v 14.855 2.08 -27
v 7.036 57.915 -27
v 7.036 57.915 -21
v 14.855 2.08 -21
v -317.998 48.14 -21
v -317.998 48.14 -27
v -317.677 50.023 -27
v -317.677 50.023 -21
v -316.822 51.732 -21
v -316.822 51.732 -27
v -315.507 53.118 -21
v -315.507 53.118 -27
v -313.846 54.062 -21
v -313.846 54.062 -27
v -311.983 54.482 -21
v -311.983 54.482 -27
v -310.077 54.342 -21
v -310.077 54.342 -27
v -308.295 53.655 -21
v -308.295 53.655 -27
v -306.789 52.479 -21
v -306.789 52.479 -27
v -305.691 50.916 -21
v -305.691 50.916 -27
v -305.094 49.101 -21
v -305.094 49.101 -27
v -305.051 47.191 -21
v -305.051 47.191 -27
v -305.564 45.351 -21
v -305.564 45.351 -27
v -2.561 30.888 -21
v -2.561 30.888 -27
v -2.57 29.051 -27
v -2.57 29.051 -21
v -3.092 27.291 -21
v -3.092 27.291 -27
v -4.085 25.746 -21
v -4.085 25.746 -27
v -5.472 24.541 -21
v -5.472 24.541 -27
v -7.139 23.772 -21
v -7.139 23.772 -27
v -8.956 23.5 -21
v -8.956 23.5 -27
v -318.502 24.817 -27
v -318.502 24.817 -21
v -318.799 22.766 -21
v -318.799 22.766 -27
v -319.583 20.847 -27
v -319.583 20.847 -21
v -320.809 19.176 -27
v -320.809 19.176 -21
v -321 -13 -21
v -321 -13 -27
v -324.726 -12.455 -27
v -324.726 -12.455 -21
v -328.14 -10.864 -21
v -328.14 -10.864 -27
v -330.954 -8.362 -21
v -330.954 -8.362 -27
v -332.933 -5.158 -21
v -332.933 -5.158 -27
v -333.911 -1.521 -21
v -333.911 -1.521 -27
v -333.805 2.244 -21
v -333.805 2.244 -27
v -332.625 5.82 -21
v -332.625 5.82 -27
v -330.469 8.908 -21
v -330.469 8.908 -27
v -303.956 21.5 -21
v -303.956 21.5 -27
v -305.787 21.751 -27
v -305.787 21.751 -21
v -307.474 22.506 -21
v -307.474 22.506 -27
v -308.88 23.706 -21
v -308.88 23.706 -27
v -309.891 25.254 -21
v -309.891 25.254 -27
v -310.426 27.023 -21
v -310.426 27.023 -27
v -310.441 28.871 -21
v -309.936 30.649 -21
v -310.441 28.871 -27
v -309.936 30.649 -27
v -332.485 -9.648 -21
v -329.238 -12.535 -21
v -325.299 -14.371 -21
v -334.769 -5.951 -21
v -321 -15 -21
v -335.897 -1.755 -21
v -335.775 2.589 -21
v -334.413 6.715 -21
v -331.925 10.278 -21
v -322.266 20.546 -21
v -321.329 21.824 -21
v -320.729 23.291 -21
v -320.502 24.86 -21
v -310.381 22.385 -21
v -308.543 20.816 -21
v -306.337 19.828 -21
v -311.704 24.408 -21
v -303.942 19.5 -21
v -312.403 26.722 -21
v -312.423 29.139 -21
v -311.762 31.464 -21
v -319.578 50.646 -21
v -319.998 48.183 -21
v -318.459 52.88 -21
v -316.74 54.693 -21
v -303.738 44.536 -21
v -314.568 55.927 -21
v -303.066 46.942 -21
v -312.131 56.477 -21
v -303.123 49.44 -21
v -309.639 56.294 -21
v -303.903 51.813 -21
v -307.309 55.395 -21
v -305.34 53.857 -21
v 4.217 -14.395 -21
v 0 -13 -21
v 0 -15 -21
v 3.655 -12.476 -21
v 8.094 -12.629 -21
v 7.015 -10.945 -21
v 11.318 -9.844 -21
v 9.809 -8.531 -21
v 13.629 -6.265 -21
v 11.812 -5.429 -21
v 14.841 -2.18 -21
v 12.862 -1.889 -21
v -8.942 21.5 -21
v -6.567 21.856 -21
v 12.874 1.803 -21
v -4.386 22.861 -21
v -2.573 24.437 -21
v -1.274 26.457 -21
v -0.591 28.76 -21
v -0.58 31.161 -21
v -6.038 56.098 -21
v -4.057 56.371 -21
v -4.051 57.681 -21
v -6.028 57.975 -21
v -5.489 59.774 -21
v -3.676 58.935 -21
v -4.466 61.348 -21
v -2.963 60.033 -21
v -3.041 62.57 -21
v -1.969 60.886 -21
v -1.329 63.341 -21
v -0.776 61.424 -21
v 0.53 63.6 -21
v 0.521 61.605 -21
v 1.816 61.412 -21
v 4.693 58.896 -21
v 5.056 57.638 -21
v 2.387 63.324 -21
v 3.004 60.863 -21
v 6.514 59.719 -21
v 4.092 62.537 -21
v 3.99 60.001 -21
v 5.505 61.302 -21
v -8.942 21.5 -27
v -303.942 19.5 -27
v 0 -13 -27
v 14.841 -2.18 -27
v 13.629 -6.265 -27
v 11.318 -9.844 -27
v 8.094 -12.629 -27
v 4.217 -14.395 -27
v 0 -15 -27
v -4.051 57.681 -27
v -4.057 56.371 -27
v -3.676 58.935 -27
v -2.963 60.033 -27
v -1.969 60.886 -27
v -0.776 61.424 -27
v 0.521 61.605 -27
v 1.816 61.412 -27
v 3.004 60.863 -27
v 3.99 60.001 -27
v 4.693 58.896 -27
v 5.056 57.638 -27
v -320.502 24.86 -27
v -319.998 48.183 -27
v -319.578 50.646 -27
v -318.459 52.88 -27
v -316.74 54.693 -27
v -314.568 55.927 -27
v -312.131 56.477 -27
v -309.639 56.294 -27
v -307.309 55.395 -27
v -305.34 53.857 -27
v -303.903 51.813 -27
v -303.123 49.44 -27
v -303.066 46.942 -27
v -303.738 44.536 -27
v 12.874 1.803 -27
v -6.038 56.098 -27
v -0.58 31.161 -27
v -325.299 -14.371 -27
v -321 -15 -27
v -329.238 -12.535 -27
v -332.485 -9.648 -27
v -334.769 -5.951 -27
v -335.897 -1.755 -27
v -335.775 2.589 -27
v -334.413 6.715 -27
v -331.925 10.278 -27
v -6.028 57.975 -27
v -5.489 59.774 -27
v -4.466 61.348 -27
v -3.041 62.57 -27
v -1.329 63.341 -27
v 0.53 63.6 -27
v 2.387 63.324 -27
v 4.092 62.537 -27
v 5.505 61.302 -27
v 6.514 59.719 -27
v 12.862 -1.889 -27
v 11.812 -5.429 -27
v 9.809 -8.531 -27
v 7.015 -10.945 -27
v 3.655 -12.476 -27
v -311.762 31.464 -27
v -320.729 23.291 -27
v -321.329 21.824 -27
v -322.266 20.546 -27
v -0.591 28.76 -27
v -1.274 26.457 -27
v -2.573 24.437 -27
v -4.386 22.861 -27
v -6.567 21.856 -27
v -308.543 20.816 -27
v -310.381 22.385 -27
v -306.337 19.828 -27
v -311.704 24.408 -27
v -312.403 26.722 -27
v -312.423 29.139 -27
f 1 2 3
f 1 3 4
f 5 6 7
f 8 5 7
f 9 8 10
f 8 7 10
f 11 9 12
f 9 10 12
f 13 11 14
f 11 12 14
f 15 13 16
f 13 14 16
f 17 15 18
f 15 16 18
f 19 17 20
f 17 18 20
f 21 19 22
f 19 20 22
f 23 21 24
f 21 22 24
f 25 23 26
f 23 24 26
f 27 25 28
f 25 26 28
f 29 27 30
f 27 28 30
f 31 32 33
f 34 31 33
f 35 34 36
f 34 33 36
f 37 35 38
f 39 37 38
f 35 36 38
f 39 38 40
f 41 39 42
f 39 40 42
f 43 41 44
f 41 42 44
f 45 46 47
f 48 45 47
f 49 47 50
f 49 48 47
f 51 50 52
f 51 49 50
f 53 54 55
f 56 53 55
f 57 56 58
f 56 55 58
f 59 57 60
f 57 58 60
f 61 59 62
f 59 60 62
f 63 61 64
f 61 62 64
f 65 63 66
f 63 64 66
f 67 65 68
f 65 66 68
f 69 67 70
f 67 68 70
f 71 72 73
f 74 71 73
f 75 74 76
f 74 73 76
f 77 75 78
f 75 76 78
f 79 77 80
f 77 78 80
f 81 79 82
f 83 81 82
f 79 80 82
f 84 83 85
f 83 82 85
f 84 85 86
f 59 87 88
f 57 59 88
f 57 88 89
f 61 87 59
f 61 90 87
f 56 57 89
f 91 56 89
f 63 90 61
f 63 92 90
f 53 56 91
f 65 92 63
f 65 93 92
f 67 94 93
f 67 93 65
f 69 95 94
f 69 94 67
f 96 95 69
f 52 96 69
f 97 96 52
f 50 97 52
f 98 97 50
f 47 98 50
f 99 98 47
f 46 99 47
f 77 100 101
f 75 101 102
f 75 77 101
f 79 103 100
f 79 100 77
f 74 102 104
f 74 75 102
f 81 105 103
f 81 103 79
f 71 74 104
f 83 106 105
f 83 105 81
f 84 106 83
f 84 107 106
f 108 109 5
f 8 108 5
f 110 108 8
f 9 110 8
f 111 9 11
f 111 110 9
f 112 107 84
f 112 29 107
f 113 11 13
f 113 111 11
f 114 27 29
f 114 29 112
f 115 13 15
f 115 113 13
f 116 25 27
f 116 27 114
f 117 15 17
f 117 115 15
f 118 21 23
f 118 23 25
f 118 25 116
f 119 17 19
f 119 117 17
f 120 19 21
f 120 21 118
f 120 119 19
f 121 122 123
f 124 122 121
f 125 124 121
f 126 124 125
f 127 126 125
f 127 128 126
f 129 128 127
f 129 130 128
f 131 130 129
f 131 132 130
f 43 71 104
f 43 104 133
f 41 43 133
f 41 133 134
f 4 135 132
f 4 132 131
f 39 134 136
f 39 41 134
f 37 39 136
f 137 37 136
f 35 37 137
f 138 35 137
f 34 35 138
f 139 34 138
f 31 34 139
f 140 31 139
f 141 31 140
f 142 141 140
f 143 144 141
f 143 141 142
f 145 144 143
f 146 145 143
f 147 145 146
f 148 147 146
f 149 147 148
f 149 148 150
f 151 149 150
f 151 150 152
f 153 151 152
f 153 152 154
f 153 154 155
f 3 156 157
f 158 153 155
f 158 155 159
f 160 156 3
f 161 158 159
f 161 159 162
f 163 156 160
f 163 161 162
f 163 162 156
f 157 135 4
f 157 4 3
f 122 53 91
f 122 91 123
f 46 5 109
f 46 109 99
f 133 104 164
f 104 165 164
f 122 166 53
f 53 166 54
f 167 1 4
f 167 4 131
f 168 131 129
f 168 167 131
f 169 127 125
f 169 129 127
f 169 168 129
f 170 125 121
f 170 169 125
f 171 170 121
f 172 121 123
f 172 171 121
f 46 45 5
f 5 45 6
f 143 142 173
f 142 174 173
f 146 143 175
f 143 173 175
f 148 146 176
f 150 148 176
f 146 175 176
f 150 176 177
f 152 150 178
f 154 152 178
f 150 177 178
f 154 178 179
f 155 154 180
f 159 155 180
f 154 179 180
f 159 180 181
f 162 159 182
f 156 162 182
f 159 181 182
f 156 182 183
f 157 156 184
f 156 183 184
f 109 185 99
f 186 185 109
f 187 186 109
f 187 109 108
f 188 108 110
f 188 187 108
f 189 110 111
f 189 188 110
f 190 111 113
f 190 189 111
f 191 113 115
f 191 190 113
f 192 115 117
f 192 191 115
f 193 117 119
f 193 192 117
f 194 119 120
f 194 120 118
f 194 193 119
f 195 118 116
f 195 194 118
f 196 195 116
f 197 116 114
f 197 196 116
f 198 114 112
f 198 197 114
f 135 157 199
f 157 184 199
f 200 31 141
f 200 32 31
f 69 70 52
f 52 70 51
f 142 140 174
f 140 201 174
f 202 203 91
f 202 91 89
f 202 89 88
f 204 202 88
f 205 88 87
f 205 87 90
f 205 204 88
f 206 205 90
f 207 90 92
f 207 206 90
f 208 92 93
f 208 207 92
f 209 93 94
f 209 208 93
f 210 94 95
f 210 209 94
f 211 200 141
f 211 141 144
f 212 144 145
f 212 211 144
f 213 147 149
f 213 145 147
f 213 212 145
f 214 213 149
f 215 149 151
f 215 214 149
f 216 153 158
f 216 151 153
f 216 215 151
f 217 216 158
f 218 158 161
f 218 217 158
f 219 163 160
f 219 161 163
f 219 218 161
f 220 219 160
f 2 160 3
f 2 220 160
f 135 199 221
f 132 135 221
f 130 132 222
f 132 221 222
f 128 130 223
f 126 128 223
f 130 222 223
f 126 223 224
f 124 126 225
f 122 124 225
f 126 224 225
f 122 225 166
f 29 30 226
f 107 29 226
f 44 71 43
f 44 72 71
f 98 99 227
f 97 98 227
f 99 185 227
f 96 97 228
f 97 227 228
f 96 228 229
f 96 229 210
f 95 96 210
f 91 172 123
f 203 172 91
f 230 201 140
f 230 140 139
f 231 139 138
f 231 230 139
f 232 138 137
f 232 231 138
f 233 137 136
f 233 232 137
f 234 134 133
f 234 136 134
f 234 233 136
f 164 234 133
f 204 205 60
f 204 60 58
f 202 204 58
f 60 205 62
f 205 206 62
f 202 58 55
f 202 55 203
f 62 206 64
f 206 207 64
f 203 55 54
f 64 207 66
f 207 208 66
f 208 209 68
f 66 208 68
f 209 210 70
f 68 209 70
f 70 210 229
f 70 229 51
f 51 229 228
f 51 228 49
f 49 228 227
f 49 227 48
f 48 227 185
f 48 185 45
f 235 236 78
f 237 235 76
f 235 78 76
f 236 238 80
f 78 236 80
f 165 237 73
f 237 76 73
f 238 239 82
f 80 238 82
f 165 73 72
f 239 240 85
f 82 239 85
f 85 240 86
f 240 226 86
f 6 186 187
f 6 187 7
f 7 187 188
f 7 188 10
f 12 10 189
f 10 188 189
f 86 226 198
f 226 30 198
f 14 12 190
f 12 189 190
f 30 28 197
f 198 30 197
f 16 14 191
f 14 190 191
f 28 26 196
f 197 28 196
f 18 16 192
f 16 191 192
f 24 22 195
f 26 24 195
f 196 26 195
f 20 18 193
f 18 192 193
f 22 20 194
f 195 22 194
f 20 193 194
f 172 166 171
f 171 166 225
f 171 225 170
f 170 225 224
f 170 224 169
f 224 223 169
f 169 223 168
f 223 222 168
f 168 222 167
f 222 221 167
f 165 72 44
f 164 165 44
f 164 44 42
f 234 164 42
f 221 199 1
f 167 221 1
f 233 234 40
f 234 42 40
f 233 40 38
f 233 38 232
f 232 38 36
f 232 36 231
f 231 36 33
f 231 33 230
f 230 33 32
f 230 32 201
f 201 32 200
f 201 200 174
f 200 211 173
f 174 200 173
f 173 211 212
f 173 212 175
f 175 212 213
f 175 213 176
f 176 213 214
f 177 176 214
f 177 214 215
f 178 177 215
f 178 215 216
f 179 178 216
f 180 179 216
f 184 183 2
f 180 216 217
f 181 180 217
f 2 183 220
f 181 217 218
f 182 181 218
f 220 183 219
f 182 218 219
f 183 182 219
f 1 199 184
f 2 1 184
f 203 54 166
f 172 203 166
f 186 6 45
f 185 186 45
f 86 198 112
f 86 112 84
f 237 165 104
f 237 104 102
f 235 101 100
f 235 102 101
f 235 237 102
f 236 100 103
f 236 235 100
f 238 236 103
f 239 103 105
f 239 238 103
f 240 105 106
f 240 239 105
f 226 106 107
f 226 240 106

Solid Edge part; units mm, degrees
sketch "Sketch1" plane through (0, 0, -27) normal (0, 0, 1) x (1, 0, 0)
  arc A0 (-321, -13) -> (-330.4687, 8.9075) centre (-321, 0) cw
  line L0 (-330.4687, 8.9075) -> (-320.8089, 19.1759)
  arc A1 (-320.8089, 19.1759) -> (-318.502, 24.8166) centre (-327, 25) ccw
  line L1 (-318.502, 24.8166) -> (-317.9985, 48.1403)
  arc A2 (-317.9985, 48.1403) -> (-305.5643, 45.3509) centre (-311.5, 48) cw
  line L2 (-305.5643, 45.3509) -> (-311.762, 31.4642)
  arc A3 (-311.762, 31.4642) -> (-303.9422, 19.5002) centre (-304, 28) ccw
  line L3 (-303.9422, 19.5002) -> (-8.9422, 21.5002)
  arc A4 (-8.9422, 21.5002) -> (-0.5797, 31.1614) centre (-9, 30) ccw
  line L4 (-0.5797, 31.1614) -> (-4.0569, 56.3715)
  arc A5 (-4.0569, 56.3715) -> (5.0556, 57.6379) centre (0.4993, 57.0047) cw
  line L5 (5.0556, 57.6379) -> (12.8744, 1.8029)
  arc A6 (12.8744, 1.8029) -> (0, -13) centre (0, 0) cw
  line L6 (0, -13) -> (-321, -13)
  line L7 (-322.2657, 20.5462) -> (-331.9254, 10.2779)
  line L8 (-320.5015, 24.8597) -> (-319.998, 48.1834)
  line L9 (-303.738, 44.5358) -> (-309.9357, 30.6491)
  line L10 (-303.9558, 21.5002) -> (-8.9559, 23.5001)
  line L11 (-2.561, 30.8881) -> (-6.0381, 56.0982)
  line L12 (7.0362, 57.9153) -> (14.8551, 2.0802)
  line L13 (0, -15) -> (-321, -15)
  arc A7 (-321, -15) -> (-331.9254, 10.2779) centre (-321, 0) cw
  arc A8 (-320.5015, 24.8597) -> (-322.2657, 20.5462) centre (-327, 25) cw
  arc A9 (-319.998, 48.1834) -> (-303.738, 44.5358) centre (-311.5, 48) cw
  arc A10 (-303.9558, 21.5002) -> (-309.9357, 30.6491) centre (-304, 28) cw
  arc A11 (-2.561, 30.8881) -> (-8.9559, 23.5001) centre (-9, 30) cw
  arc A12 (7.0362, 57.9153) -> (-6.0381, 56.0982) centre (0.5, 57) ccw
  arc A13 (0, -15) -> (14.8551, 2.0802) centre (0, 0) ccw
extrude "Protrusion1" add sketch "Sketch1" along normal blind 6
